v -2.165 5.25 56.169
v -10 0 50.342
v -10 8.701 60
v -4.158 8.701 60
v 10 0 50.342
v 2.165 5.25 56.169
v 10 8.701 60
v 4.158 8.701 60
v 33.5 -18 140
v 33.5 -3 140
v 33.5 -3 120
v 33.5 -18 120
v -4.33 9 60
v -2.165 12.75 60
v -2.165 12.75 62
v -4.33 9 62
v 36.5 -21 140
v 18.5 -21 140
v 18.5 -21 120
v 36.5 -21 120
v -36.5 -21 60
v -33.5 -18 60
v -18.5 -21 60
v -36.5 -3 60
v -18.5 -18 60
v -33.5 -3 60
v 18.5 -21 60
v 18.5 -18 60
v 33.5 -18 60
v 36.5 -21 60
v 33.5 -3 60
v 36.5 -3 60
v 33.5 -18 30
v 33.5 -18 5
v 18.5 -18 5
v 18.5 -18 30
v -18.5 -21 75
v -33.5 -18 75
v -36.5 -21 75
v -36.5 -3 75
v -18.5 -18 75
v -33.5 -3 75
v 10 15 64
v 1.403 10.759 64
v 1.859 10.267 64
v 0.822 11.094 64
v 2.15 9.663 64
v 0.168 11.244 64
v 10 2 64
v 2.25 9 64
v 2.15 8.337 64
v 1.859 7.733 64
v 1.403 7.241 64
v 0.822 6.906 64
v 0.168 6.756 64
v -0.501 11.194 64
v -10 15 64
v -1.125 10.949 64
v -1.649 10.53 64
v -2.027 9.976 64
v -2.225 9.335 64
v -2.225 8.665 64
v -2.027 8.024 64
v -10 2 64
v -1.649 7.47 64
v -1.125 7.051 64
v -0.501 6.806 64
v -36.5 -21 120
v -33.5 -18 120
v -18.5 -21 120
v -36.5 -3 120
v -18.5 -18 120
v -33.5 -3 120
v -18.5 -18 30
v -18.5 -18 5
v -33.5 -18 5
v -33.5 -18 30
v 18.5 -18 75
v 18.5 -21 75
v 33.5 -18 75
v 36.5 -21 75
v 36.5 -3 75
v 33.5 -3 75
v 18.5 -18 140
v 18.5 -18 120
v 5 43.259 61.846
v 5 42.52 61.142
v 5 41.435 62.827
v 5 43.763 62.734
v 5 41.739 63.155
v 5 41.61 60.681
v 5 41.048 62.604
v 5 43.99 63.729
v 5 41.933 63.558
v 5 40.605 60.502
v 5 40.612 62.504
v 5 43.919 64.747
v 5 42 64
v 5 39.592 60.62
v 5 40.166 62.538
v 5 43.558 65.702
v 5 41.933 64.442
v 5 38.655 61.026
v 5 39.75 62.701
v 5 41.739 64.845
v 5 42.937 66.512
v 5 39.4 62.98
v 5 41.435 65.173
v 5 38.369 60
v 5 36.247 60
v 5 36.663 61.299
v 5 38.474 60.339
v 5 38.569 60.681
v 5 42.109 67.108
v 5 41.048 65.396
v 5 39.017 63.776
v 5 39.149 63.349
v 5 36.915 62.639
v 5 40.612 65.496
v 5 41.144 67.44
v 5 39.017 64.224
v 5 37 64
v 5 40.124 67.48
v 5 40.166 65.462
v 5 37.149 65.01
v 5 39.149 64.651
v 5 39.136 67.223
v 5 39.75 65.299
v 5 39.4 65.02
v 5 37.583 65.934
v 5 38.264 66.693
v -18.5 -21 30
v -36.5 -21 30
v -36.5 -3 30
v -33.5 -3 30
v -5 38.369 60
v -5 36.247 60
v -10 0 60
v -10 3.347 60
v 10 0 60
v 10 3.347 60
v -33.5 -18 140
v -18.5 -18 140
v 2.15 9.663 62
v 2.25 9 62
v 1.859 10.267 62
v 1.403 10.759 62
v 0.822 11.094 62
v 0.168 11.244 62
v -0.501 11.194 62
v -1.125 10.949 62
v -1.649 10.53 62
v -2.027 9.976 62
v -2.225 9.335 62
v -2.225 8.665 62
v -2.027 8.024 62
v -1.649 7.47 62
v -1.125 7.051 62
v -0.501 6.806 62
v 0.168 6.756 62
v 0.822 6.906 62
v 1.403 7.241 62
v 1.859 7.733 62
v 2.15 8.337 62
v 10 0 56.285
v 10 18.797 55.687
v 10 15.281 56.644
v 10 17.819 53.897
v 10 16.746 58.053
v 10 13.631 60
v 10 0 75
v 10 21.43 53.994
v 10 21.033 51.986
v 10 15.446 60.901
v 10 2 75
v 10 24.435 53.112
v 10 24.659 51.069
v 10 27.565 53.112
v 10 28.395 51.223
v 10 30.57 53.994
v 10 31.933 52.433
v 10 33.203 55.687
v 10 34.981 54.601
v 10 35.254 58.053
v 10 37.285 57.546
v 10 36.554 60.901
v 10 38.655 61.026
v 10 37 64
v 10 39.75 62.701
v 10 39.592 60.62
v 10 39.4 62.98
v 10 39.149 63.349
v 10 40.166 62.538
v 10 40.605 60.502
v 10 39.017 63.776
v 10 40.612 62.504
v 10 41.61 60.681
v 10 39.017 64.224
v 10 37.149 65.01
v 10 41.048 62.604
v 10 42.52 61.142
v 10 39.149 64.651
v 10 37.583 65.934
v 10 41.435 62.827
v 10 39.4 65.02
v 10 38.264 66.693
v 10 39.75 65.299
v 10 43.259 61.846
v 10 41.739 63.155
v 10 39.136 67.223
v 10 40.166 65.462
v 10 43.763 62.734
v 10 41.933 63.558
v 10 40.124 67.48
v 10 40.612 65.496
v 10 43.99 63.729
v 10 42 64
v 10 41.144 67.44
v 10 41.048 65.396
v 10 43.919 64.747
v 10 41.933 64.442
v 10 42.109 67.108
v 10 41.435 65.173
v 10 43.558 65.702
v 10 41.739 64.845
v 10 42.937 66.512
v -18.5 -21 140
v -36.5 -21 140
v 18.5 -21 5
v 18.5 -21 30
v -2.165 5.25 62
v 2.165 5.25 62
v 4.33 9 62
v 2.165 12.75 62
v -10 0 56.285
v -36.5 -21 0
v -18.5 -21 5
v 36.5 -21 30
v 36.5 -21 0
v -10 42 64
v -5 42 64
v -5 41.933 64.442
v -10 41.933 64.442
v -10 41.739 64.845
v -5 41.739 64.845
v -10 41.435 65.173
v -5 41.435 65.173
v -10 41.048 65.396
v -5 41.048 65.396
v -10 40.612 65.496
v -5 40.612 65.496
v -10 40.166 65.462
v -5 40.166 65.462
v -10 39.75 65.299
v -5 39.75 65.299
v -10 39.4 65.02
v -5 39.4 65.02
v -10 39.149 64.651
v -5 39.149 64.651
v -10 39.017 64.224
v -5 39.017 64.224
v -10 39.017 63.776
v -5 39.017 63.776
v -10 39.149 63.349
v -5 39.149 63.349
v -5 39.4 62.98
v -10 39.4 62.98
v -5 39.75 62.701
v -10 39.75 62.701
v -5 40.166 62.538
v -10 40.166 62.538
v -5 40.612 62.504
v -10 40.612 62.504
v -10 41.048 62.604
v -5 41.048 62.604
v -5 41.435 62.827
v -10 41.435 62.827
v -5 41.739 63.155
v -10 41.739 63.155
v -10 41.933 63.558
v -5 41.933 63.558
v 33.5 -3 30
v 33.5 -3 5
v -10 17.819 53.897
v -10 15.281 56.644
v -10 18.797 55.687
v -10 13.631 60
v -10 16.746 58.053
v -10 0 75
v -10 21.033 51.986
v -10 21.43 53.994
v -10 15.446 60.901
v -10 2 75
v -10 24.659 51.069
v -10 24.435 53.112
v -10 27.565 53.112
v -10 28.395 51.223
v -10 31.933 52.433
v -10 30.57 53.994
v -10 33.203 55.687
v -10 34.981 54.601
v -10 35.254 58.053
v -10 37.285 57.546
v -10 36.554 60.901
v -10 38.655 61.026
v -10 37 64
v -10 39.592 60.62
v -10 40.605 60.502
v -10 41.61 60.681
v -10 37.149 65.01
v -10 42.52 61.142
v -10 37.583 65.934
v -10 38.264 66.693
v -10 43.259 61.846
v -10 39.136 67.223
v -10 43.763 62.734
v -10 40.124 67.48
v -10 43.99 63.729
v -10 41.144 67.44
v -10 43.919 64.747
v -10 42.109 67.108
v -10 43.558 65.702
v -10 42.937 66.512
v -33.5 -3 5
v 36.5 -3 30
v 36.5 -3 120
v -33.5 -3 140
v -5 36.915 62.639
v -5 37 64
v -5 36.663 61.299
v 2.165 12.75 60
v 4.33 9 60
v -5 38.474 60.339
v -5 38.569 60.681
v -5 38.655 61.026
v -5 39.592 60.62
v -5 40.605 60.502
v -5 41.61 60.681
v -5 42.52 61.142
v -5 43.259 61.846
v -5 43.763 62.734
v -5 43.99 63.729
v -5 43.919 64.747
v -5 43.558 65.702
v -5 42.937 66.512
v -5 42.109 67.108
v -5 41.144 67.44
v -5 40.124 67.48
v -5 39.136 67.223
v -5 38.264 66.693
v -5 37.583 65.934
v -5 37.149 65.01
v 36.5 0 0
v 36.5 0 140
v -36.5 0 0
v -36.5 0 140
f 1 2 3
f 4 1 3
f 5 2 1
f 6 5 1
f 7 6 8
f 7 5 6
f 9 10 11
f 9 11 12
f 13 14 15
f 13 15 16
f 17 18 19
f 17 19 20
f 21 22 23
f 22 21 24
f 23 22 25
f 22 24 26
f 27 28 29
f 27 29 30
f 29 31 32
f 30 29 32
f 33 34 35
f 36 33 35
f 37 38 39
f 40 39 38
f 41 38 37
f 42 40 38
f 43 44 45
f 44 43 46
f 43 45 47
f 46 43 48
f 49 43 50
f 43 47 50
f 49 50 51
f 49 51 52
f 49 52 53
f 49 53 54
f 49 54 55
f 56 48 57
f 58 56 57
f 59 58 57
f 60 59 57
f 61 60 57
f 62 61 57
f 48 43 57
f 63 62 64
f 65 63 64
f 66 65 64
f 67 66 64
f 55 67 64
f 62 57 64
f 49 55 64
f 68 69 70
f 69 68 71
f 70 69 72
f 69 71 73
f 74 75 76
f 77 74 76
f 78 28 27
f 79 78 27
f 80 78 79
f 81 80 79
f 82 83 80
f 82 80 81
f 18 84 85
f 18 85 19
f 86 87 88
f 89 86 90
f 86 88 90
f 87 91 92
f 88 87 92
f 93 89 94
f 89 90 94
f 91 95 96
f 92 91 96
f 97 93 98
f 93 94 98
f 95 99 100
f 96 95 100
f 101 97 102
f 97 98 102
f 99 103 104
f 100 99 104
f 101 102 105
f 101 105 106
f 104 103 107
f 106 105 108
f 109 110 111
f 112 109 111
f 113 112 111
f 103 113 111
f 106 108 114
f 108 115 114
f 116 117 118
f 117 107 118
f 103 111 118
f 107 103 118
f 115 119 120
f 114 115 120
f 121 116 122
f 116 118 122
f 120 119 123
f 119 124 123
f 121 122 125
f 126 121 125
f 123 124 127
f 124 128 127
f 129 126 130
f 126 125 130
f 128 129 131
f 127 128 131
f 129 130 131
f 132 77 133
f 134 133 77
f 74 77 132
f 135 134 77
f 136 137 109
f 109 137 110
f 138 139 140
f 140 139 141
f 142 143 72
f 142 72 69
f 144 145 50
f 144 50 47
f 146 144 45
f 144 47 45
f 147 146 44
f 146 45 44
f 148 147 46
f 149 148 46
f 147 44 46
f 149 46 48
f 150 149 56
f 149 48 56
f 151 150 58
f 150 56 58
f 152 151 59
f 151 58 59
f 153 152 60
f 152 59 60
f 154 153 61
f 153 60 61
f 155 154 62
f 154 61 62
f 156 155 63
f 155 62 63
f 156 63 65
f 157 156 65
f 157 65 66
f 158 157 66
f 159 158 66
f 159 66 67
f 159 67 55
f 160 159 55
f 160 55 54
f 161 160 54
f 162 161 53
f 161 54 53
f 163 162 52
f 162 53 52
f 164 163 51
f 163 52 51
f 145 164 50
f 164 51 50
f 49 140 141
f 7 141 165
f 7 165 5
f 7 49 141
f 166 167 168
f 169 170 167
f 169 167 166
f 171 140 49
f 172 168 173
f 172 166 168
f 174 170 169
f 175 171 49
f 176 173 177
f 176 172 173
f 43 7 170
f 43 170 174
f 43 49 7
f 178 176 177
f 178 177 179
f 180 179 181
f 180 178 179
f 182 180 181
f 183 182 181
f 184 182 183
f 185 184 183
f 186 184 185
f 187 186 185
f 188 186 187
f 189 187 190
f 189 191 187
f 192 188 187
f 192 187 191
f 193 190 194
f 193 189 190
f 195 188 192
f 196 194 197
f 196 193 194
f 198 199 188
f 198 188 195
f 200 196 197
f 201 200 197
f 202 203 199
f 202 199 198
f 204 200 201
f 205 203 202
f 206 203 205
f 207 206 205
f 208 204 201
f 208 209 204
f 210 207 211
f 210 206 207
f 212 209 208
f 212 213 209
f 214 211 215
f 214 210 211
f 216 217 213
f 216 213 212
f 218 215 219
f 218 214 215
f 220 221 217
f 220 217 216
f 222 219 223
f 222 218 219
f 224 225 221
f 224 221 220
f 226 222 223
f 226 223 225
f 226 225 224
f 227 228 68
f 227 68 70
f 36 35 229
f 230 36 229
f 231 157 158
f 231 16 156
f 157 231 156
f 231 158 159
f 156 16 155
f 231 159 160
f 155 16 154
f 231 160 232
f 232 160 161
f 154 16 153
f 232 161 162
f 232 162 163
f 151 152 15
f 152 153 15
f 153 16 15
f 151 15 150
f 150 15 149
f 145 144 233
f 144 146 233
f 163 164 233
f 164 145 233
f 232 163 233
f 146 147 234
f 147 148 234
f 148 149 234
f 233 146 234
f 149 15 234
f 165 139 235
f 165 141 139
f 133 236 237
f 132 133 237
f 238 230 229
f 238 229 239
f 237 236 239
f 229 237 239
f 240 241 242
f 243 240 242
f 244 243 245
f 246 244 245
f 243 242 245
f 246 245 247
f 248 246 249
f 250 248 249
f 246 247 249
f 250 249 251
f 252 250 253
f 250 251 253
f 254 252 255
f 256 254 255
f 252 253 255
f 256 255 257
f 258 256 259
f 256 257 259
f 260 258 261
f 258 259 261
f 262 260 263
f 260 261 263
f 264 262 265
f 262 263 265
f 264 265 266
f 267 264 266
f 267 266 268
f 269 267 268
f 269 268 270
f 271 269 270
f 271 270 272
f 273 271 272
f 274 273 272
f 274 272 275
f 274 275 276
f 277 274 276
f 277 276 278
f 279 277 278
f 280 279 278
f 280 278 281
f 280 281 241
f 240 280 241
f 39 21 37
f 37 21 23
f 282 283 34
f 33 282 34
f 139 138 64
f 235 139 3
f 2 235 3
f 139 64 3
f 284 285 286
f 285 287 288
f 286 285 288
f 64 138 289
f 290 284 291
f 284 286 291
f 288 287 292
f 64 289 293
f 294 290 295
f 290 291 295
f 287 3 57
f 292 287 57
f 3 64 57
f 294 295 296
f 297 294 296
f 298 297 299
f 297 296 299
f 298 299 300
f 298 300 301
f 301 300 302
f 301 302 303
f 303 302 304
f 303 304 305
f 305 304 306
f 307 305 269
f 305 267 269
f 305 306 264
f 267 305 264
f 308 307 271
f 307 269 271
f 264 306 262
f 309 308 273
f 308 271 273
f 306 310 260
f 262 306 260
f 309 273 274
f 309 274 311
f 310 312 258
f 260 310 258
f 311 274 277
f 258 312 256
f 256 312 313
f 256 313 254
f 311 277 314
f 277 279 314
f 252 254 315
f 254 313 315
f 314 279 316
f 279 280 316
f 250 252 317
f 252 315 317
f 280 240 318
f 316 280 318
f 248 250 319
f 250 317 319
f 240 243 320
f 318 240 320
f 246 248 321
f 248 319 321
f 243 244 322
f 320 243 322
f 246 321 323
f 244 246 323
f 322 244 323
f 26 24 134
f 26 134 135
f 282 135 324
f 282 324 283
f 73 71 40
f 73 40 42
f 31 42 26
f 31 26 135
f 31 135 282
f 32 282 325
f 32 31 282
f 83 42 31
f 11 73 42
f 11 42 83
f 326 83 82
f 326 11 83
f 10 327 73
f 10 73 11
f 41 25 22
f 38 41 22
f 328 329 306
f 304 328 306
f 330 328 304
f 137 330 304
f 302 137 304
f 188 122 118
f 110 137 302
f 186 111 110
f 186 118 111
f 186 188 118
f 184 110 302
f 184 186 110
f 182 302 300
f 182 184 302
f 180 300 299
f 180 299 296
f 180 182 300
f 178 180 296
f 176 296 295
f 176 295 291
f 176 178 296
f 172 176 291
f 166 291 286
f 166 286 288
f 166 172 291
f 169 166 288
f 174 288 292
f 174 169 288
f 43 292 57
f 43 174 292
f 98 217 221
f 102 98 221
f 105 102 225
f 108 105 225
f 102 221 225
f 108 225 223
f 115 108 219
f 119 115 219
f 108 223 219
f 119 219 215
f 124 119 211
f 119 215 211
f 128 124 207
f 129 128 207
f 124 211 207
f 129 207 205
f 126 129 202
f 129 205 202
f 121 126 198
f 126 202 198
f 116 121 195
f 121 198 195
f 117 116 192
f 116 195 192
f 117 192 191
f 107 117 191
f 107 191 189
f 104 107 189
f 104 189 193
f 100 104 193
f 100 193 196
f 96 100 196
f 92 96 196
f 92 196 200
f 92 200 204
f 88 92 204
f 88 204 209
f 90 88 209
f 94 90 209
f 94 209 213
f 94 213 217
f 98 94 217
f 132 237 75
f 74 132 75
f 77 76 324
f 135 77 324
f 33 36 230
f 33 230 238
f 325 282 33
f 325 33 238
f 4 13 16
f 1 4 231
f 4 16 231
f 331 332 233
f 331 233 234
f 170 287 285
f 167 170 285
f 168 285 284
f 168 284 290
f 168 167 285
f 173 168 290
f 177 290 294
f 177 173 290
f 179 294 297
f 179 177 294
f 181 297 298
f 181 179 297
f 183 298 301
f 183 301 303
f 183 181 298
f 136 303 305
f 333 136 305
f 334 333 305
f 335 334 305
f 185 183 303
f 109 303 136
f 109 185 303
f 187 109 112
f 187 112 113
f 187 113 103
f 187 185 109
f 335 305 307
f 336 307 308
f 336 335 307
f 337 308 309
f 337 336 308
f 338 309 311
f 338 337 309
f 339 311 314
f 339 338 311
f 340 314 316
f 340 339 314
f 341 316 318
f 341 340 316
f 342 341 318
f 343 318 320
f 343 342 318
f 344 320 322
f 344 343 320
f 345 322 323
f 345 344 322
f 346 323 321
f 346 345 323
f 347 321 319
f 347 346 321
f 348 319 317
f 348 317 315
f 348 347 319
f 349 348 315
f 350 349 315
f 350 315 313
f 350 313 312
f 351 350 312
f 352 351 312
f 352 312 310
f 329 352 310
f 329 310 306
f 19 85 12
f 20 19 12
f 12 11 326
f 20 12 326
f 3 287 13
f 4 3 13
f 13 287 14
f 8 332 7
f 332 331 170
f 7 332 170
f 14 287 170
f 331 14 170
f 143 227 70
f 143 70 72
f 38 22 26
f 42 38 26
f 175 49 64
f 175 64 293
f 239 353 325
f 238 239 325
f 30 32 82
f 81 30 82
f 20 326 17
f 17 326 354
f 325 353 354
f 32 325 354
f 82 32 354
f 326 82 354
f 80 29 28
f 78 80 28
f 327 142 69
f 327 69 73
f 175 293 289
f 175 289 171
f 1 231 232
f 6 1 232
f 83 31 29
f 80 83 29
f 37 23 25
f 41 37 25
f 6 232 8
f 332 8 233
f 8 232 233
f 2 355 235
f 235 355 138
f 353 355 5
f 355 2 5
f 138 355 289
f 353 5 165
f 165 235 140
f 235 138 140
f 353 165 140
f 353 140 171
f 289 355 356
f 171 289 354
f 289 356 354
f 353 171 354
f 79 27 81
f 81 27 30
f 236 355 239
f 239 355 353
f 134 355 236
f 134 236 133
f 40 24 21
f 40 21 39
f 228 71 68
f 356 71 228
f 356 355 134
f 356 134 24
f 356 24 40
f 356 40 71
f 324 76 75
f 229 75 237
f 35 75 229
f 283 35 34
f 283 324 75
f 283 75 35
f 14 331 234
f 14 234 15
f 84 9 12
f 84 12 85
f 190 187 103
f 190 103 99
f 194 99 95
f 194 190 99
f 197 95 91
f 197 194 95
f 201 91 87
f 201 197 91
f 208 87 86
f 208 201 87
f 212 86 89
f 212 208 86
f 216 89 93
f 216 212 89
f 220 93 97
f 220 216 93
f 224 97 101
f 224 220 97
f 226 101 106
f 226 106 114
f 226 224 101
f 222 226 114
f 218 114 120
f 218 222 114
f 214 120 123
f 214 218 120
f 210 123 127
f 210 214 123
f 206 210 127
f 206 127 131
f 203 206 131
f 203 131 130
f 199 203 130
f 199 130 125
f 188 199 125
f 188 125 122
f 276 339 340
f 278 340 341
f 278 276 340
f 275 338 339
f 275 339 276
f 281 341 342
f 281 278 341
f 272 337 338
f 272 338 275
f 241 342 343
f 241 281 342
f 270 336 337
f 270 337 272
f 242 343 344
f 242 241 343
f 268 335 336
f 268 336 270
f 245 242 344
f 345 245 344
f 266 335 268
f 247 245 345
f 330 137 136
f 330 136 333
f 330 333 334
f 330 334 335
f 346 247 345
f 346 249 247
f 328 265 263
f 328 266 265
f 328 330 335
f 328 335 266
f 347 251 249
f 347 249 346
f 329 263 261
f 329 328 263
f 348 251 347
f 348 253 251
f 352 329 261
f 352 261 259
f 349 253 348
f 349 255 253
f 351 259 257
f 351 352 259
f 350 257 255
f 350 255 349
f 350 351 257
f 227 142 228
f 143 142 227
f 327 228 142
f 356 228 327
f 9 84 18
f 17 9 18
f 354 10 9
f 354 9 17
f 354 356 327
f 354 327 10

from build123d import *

# Parameters (mm, degrees)
F1_DEPTH       = 30
F2_W           = 73
F2_H           = 21
F3_DEPTH       = 5
F4_W           = 73
F4_H           = 110
F5_DEPTH       = 3
F9_DEPTH       = 15
F12_DEPTH      = 20
F13_W          = 20
F13_H          = 15
F14_DEPTH      = 15
F16_DEPTH      = 20
F17_R          = 1.5
F18_DEPTH      = 49.4
F19_W          = 10
F19_H          = 11
F20_DEPTH      = 10.001
F21_W          = 15
F21_H          = 12
F22_DEPTH      = 46.501
F24_DEPTH      = 10
F25_R          = 2.25
F26_DEPTH      = 10.55
F28_DEPTH      = 10
F28_DEPTH_BACK = 2


with BuildPart() as f1:
    # F0 (on Top) → F1 (new body)
    with BuildSketch(Plane.XY):
        Polygon((-36.5, -21), (-18.5, -21), (-18.5, -18), (-33.5, -18), (-33.5, -3), (33.5, -3), (33.5, -18), (18.5, -18), (18.5, -21), (36.5, -21), (36.5, 0), (-36.5, 0), align=None)
    extrude(amount=F1_DEPTH)

    # F2 (on Top) → F3 (join)
    with BuildSketch(Plane.XY):
        with Locations((0, -10.5)):
            Rectangle(F2_W, F2_H)
    extrude(amount=F3_DEPTH)

    # F4 (on Front) → F5 (join)
    with BuildSketch(Plane.XZ):
        with Locations((0, 85)):
            Rectangle(F4_W, F4_H)
    extrude(amount=F5_DEPTH)

    # F8 (on offset) → F9 (join)
    with BuildSketch(Plane.XY.offset(60)):
        Polygon((-18.5, -18), (-33.5, -18), (-33.5, -3), (-36.5, -3), (-36.5, -21), (-18.5, -21), align=None)
        Polygon((33.5, -18), (18.5, -18), (18.5, -21), (36.5, -21), (36.5, -3), (33.5, -3), align=None)
    extrude(amount=F9_DEPTH)

    # F11 (on offset) → F12 (join)
    with BuildSketch(Plane.XY.offset(140)):
        Polygon((-33.5, -18), (-33.5, -3), (-36.5, -3), (-36.5, -21), (-18.5, -21), (-18.5, -18), align=None)
        Polygon((36.5, -21), (36.5, -3), (33.5, -3), (33.5, -18), (18.5, -18), (18.5, -21), align=None)
    extrude(amount=-F12_DEPTH)

    # F13 (on offset) → F14 (join)
    with BuildSketch(Plane.XY.offset(60)):
        with Locations((0, 7.5)):
            Rectangle(F13_W, F13_H)
    extrude(amount=F14_DEPTH)

    # F15 (on face) → F16 (join)
    with BuildSketch(Plane.YZ.offset(10)):
        with BuildLine():
            ThreePointArc((37, 64), (26, 53), (15, 64))
            Line((15, 64), (13, 64))
            ThreePointArc((13, 64), (24.502876321, 51.0864946397), (38.6551724138, 61.0256746686))
            ThreePointArc((38.6551724138, 61.0256746686), (43.5583407717, 65.7019258868), (37, 64))
        make_face()
    extrude(amount=-F16_DEPTH)

    # F17 (on face) → F18 (cut)
    with BuildSketch(Plane.YZ.offset(10)):
        with Locations((40.5, 64)):
            Circle(F17_R)
    extrude(amount=-F18_DEPTH, mode=Mode.SUBTRACT)

    # F19 (on offset) → F20 (cut, through all)
    with BuildSketch(Plane.XZ.offset(-34)):
        with Locations((0, 65.5)):
            Rectangle(F19_W, F19_H)
    extrude(amount=-F20_DEPTH, mode=Mode.SUBTRACT)

    # F21 (on face) → F22 (cut, through all)
    with BuildSketch(Plane(origin=(-10, 0, 0), x_dir=(0, -1, 0), z_dir=(-1, 0, 0))):
        with Locations((-9.5, 70)):
            Rectangle(F21_W, F21_H)
    extrude(amount=-F22_DEPTH, mode=Mode.SUBTRACT)

    # F23 (on Right) → F24 (join, symmetric)
    with BuildSketch(Plane.YZ):
        Polygon((0, 56.2852394792), (0, 50.3416226459), (8.7014795803, 60), (3.3467229155, 60), align=None)
    extrude(amount=F24_DEPTH, both=True)

    # F25 (on offset) → F26 (cut, symmetric)
    with BuildSketch(Plane.XY.offset(60)):
        with Locations((0, 9)):
            Circle(F25_R)
    extrude(amount=F26_DEPTH, both=True, mode=Mode.SUBTRACT)

    # F27 (on face) → F28 (cut, two sides)
    with BuildSketch(Plane.XY.offset(60)) as f28_sk:
        Polygon((2.1650635095, 5.25), (4.3301270189, 9), (2.1650635095, 12.75), (-2.1650635095, 12.75), (-4.3301270189, 9), (-2.1650635095, 5.25), align=None)
    extrude(amount=-F28_DEPTH, mode=Mode.SUBTRACT)
    extrude(f28_sk.sketch, amount=F28_DEPTH_BACK, mode=Mode.SUBTRACT)


solid = f1.part
